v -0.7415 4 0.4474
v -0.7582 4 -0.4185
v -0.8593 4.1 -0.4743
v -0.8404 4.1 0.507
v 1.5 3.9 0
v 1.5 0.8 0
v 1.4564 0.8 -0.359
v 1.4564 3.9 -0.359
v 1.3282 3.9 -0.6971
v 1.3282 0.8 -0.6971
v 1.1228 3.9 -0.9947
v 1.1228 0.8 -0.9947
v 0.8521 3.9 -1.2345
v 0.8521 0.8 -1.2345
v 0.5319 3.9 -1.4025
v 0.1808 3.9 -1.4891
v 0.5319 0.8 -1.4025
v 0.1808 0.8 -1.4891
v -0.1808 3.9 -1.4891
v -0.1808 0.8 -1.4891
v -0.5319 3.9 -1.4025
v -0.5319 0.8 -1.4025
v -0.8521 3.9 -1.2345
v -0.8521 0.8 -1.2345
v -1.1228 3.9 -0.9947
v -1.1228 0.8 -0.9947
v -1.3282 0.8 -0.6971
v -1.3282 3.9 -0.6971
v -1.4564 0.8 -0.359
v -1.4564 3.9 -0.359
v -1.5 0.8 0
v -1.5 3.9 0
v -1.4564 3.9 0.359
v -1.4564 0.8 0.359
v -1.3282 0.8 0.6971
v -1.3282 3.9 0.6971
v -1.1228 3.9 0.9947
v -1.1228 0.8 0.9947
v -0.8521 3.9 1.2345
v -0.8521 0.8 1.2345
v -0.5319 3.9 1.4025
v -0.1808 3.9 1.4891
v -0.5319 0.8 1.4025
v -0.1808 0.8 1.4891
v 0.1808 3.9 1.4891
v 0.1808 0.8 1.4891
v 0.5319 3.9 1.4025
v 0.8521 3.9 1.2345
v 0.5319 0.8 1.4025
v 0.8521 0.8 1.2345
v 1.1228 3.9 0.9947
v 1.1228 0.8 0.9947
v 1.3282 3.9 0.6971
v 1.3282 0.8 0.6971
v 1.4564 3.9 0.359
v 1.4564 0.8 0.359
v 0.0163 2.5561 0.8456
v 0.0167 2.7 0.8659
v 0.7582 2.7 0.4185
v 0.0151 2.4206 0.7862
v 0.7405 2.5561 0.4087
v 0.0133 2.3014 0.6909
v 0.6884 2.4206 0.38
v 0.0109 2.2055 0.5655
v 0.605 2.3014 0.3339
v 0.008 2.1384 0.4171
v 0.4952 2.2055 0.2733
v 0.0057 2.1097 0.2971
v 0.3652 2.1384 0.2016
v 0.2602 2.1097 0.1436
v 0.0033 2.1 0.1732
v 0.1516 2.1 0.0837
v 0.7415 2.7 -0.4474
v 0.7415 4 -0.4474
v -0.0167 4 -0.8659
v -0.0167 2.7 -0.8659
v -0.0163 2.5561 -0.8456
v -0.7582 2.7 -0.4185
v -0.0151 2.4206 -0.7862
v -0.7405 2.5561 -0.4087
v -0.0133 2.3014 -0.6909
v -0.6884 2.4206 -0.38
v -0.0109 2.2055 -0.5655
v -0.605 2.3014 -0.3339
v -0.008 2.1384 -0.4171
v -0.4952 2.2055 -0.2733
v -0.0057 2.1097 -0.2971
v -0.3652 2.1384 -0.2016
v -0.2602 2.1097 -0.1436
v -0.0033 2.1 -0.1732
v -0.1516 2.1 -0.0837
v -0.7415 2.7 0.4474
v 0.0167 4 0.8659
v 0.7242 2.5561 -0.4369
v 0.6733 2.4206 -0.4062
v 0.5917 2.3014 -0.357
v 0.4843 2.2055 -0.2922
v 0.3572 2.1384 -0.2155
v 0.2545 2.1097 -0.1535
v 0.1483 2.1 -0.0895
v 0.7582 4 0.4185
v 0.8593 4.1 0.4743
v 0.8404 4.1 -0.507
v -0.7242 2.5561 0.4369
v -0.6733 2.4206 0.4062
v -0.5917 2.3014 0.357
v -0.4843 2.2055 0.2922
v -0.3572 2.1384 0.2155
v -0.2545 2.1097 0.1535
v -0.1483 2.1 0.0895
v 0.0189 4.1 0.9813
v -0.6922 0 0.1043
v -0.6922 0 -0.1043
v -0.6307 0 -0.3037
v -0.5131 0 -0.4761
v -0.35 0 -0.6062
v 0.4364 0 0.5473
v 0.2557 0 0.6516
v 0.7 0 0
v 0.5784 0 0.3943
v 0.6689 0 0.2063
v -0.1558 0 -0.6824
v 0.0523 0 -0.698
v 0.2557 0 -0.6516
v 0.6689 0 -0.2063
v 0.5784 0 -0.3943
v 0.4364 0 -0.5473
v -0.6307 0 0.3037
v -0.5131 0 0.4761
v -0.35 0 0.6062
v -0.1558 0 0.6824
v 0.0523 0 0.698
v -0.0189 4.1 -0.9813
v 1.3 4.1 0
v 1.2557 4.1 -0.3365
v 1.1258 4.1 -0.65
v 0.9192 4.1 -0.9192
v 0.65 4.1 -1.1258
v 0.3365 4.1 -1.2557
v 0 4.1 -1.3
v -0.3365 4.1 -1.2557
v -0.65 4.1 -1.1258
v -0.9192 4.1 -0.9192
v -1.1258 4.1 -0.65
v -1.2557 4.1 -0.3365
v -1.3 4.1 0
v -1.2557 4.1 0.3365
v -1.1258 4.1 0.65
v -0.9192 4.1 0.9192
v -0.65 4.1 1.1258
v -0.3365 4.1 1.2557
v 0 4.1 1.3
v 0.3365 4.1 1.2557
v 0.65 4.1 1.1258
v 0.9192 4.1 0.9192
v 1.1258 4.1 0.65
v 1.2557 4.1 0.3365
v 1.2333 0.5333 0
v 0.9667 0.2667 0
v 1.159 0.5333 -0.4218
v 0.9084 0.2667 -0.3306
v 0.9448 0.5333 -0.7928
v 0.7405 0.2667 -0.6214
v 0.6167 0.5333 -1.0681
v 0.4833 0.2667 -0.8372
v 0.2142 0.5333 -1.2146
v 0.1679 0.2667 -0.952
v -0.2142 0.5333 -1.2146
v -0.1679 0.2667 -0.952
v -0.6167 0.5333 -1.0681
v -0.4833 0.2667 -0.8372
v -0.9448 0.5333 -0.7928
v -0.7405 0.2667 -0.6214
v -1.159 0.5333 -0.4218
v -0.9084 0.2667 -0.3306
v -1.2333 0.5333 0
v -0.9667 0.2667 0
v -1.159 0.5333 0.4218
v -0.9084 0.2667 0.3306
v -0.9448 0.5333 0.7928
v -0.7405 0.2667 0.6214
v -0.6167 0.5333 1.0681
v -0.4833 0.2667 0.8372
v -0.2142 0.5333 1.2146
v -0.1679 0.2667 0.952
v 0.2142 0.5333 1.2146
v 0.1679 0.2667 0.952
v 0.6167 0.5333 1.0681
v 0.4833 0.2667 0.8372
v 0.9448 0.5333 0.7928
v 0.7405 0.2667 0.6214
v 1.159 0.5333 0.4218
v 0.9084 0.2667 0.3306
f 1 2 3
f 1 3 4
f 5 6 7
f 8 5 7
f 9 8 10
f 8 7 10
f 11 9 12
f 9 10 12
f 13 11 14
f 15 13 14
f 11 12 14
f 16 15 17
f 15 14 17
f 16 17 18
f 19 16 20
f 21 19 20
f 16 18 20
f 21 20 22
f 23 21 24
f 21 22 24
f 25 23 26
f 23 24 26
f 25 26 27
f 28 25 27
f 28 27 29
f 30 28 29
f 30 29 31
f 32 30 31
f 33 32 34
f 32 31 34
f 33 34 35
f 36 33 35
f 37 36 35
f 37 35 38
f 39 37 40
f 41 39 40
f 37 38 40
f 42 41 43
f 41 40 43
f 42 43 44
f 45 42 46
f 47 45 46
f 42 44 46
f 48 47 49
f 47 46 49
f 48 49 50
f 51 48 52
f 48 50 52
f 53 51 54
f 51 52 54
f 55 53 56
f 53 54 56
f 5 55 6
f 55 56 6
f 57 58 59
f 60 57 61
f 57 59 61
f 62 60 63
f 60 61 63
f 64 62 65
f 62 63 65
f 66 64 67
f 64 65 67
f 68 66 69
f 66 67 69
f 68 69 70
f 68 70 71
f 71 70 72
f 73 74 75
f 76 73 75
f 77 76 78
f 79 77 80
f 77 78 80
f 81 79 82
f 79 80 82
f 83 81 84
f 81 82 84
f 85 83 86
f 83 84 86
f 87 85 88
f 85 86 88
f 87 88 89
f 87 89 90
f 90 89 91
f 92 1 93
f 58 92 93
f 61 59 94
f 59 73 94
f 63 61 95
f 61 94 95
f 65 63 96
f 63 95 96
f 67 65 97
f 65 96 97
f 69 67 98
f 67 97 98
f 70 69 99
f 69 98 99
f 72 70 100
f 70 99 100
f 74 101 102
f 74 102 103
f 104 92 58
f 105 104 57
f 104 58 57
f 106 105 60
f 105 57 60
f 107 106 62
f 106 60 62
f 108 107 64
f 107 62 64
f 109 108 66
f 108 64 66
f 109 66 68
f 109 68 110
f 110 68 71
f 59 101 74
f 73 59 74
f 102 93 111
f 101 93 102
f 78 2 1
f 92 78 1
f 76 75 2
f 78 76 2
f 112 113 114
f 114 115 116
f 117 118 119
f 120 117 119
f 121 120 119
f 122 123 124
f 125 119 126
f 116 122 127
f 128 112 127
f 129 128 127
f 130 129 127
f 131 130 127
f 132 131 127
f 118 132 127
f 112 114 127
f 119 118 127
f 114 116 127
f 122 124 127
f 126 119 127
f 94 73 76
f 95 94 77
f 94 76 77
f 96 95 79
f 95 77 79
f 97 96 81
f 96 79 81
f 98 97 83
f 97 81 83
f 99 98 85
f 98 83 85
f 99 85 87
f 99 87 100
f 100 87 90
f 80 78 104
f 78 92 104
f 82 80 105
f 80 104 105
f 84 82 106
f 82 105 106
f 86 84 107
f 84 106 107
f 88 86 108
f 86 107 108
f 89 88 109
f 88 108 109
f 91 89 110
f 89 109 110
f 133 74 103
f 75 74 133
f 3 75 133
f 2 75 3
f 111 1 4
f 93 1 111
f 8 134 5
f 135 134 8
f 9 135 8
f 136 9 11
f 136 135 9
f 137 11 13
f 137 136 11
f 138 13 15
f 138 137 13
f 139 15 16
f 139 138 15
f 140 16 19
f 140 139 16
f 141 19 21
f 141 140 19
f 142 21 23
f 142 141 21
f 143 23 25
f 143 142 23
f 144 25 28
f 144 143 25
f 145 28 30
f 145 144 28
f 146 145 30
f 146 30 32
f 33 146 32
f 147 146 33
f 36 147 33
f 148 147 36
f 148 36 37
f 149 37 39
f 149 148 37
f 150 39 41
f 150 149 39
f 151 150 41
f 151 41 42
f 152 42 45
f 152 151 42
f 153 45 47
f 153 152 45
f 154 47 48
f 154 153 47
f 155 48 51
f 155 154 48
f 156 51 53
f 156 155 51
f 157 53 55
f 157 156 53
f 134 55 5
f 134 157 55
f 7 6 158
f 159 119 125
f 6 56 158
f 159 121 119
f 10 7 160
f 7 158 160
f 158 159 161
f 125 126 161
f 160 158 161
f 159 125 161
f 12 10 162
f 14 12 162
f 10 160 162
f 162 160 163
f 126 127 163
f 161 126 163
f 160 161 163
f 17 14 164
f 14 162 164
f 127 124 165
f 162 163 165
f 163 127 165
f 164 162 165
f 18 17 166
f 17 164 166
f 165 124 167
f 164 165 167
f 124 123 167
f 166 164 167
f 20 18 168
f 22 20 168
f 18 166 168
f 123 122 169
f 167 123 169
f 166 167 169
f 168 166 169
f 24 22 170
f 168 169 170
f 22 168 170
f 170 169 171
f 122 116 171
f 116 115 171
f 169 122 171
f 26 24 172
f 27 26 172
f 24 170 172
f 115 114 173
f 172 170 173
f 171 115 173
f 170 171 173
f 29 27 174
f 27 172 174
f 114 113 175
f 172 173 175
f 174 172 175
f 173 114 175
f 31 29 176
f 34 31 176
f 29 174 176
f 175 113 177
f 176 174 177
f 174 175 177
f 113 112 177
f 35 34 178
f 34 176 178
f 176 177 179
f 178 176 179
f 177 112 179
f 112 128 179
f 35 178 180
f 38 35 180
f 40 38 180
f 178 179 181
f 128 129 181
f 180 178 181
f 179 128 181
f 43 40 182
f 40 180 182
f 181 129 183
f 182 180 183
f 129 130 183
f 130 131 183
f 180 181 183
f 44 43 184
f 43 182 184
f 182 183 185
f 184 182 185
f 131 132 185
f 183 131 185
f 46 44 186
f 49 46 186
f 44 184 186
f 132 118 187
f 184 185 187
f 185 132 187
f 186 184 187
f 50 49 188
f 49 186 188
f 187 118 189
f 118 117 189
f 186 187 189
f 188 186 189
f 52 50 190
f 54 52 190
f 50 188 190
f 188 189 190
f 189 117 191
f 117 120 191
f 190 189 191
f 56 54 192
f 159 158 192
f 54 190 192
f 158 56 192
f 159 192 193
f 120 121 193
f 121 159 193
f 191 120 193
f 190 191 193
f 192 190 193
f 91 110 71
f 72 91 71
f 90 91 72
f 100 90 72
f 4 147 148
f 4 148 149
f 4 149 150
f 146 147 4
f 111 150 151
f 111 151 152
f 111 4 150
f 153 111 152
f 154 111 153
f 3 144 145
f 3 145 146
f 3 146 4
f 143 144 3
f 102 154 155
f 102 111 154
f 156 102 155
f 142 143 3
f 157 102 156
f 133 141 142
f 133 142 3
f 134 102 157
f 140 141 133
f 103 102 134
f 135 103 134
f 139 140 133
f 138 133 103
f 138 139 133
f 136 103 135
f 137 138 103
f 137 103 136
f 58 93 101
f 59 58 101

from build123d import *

# Parameters (mm, degrees)
SKETCH1_R           = 1.5
BOSS_EXTRUDE1_DEPTH = 4.1
CUT_EXTRUDE2_DEPTH  = 2
CHAMFER1_SIZE       = 0.2
CHAMFER2_SIZE       = 0.1
FILLET3_R           = 0.6
CHAMFER3_SIZE       = 0.8


with BuildPart() as part:
    # Sketch1 → Boss-Extrude1 (new body)
    with BuildSketch(Plane(origin=(0, 0, 0), x_dir=(1, 0, 0), z_dir=(0, 1, 0))):
        Circle(SKETCH1_R)
    extrude(amount=BOSS_EXTRUDE1_DEPTH)

    # Sketch2 → Cut-Extrude2 (cut)
    with BuildSketch(Plane(origin=(0, 4.1, 0), x_dir=(1, 0, 0), z_dir=(0, 1, 0))):
        Polygon((0.758195887, -0.418496113), (0.741526209, 0.447368843), (-0.016669678, 0.865864956), (-0.758195887, 0.418496113), (-0.741526209, -0.447368843), (0.016669678, -0.865864956), align=None)
    extrude(amount=-CUT_EXTRUDE2_DEPTH, mode=Mode.SUBTRACT)

    # Chamfer1
    chamfer1_edges = [part.edges().sort_by_distance(p)[0] for p in [
        (-1.5, 4.1, 0),
    ]]
    chamfer(chamfer1_edges, length=CHAMFER1_SIZE)

    # Chamfer2
    chamfer2_edges = [part.edges().sort_by_distance(p)[0] for p in [
        (0.387432783, 4.1, 0.642180535),
        (0.749861048, 4.1, -0.014436365),
        (0.362428265, 4.1, -0.656616899),
        (-0.387432783, 4.1, -0.642180535),
        (-0.749861048, 4.1, 0.014436365),
        (-0.362428265, 4.1, 0.656616899),
    ]]
    chamfer(chamfer2_edges, length=CHAMFER2_SIZE)

    # Fillet3
    fillet3_edges = [part.edges().sort_by_distance(p)[0] for p in [
        (0.749861048, 2.1, -0.014436365),
        (0.387432783, 2.1, 0.642180535),
        (-0.362428265, 2.1, 0.656616899),
        (-0.749861048, 2.1, 0.014436365),
        (-0.387432783, 2.1, -0.642180535),
        (0.362428265, 2.1, -0.656616899),
    ]]
    fillet(fillet3_edges, radius=FILLET3_R)

    # Chamfer3
    chamfer3_edges = [part.edges().sort_by_distance(p)[0] for p in [
        (-1.5, 0, 0),
    ]]
    chamfer(chamfer3_edges, length=CHAMFER3_SIZE)


solid = part.part
